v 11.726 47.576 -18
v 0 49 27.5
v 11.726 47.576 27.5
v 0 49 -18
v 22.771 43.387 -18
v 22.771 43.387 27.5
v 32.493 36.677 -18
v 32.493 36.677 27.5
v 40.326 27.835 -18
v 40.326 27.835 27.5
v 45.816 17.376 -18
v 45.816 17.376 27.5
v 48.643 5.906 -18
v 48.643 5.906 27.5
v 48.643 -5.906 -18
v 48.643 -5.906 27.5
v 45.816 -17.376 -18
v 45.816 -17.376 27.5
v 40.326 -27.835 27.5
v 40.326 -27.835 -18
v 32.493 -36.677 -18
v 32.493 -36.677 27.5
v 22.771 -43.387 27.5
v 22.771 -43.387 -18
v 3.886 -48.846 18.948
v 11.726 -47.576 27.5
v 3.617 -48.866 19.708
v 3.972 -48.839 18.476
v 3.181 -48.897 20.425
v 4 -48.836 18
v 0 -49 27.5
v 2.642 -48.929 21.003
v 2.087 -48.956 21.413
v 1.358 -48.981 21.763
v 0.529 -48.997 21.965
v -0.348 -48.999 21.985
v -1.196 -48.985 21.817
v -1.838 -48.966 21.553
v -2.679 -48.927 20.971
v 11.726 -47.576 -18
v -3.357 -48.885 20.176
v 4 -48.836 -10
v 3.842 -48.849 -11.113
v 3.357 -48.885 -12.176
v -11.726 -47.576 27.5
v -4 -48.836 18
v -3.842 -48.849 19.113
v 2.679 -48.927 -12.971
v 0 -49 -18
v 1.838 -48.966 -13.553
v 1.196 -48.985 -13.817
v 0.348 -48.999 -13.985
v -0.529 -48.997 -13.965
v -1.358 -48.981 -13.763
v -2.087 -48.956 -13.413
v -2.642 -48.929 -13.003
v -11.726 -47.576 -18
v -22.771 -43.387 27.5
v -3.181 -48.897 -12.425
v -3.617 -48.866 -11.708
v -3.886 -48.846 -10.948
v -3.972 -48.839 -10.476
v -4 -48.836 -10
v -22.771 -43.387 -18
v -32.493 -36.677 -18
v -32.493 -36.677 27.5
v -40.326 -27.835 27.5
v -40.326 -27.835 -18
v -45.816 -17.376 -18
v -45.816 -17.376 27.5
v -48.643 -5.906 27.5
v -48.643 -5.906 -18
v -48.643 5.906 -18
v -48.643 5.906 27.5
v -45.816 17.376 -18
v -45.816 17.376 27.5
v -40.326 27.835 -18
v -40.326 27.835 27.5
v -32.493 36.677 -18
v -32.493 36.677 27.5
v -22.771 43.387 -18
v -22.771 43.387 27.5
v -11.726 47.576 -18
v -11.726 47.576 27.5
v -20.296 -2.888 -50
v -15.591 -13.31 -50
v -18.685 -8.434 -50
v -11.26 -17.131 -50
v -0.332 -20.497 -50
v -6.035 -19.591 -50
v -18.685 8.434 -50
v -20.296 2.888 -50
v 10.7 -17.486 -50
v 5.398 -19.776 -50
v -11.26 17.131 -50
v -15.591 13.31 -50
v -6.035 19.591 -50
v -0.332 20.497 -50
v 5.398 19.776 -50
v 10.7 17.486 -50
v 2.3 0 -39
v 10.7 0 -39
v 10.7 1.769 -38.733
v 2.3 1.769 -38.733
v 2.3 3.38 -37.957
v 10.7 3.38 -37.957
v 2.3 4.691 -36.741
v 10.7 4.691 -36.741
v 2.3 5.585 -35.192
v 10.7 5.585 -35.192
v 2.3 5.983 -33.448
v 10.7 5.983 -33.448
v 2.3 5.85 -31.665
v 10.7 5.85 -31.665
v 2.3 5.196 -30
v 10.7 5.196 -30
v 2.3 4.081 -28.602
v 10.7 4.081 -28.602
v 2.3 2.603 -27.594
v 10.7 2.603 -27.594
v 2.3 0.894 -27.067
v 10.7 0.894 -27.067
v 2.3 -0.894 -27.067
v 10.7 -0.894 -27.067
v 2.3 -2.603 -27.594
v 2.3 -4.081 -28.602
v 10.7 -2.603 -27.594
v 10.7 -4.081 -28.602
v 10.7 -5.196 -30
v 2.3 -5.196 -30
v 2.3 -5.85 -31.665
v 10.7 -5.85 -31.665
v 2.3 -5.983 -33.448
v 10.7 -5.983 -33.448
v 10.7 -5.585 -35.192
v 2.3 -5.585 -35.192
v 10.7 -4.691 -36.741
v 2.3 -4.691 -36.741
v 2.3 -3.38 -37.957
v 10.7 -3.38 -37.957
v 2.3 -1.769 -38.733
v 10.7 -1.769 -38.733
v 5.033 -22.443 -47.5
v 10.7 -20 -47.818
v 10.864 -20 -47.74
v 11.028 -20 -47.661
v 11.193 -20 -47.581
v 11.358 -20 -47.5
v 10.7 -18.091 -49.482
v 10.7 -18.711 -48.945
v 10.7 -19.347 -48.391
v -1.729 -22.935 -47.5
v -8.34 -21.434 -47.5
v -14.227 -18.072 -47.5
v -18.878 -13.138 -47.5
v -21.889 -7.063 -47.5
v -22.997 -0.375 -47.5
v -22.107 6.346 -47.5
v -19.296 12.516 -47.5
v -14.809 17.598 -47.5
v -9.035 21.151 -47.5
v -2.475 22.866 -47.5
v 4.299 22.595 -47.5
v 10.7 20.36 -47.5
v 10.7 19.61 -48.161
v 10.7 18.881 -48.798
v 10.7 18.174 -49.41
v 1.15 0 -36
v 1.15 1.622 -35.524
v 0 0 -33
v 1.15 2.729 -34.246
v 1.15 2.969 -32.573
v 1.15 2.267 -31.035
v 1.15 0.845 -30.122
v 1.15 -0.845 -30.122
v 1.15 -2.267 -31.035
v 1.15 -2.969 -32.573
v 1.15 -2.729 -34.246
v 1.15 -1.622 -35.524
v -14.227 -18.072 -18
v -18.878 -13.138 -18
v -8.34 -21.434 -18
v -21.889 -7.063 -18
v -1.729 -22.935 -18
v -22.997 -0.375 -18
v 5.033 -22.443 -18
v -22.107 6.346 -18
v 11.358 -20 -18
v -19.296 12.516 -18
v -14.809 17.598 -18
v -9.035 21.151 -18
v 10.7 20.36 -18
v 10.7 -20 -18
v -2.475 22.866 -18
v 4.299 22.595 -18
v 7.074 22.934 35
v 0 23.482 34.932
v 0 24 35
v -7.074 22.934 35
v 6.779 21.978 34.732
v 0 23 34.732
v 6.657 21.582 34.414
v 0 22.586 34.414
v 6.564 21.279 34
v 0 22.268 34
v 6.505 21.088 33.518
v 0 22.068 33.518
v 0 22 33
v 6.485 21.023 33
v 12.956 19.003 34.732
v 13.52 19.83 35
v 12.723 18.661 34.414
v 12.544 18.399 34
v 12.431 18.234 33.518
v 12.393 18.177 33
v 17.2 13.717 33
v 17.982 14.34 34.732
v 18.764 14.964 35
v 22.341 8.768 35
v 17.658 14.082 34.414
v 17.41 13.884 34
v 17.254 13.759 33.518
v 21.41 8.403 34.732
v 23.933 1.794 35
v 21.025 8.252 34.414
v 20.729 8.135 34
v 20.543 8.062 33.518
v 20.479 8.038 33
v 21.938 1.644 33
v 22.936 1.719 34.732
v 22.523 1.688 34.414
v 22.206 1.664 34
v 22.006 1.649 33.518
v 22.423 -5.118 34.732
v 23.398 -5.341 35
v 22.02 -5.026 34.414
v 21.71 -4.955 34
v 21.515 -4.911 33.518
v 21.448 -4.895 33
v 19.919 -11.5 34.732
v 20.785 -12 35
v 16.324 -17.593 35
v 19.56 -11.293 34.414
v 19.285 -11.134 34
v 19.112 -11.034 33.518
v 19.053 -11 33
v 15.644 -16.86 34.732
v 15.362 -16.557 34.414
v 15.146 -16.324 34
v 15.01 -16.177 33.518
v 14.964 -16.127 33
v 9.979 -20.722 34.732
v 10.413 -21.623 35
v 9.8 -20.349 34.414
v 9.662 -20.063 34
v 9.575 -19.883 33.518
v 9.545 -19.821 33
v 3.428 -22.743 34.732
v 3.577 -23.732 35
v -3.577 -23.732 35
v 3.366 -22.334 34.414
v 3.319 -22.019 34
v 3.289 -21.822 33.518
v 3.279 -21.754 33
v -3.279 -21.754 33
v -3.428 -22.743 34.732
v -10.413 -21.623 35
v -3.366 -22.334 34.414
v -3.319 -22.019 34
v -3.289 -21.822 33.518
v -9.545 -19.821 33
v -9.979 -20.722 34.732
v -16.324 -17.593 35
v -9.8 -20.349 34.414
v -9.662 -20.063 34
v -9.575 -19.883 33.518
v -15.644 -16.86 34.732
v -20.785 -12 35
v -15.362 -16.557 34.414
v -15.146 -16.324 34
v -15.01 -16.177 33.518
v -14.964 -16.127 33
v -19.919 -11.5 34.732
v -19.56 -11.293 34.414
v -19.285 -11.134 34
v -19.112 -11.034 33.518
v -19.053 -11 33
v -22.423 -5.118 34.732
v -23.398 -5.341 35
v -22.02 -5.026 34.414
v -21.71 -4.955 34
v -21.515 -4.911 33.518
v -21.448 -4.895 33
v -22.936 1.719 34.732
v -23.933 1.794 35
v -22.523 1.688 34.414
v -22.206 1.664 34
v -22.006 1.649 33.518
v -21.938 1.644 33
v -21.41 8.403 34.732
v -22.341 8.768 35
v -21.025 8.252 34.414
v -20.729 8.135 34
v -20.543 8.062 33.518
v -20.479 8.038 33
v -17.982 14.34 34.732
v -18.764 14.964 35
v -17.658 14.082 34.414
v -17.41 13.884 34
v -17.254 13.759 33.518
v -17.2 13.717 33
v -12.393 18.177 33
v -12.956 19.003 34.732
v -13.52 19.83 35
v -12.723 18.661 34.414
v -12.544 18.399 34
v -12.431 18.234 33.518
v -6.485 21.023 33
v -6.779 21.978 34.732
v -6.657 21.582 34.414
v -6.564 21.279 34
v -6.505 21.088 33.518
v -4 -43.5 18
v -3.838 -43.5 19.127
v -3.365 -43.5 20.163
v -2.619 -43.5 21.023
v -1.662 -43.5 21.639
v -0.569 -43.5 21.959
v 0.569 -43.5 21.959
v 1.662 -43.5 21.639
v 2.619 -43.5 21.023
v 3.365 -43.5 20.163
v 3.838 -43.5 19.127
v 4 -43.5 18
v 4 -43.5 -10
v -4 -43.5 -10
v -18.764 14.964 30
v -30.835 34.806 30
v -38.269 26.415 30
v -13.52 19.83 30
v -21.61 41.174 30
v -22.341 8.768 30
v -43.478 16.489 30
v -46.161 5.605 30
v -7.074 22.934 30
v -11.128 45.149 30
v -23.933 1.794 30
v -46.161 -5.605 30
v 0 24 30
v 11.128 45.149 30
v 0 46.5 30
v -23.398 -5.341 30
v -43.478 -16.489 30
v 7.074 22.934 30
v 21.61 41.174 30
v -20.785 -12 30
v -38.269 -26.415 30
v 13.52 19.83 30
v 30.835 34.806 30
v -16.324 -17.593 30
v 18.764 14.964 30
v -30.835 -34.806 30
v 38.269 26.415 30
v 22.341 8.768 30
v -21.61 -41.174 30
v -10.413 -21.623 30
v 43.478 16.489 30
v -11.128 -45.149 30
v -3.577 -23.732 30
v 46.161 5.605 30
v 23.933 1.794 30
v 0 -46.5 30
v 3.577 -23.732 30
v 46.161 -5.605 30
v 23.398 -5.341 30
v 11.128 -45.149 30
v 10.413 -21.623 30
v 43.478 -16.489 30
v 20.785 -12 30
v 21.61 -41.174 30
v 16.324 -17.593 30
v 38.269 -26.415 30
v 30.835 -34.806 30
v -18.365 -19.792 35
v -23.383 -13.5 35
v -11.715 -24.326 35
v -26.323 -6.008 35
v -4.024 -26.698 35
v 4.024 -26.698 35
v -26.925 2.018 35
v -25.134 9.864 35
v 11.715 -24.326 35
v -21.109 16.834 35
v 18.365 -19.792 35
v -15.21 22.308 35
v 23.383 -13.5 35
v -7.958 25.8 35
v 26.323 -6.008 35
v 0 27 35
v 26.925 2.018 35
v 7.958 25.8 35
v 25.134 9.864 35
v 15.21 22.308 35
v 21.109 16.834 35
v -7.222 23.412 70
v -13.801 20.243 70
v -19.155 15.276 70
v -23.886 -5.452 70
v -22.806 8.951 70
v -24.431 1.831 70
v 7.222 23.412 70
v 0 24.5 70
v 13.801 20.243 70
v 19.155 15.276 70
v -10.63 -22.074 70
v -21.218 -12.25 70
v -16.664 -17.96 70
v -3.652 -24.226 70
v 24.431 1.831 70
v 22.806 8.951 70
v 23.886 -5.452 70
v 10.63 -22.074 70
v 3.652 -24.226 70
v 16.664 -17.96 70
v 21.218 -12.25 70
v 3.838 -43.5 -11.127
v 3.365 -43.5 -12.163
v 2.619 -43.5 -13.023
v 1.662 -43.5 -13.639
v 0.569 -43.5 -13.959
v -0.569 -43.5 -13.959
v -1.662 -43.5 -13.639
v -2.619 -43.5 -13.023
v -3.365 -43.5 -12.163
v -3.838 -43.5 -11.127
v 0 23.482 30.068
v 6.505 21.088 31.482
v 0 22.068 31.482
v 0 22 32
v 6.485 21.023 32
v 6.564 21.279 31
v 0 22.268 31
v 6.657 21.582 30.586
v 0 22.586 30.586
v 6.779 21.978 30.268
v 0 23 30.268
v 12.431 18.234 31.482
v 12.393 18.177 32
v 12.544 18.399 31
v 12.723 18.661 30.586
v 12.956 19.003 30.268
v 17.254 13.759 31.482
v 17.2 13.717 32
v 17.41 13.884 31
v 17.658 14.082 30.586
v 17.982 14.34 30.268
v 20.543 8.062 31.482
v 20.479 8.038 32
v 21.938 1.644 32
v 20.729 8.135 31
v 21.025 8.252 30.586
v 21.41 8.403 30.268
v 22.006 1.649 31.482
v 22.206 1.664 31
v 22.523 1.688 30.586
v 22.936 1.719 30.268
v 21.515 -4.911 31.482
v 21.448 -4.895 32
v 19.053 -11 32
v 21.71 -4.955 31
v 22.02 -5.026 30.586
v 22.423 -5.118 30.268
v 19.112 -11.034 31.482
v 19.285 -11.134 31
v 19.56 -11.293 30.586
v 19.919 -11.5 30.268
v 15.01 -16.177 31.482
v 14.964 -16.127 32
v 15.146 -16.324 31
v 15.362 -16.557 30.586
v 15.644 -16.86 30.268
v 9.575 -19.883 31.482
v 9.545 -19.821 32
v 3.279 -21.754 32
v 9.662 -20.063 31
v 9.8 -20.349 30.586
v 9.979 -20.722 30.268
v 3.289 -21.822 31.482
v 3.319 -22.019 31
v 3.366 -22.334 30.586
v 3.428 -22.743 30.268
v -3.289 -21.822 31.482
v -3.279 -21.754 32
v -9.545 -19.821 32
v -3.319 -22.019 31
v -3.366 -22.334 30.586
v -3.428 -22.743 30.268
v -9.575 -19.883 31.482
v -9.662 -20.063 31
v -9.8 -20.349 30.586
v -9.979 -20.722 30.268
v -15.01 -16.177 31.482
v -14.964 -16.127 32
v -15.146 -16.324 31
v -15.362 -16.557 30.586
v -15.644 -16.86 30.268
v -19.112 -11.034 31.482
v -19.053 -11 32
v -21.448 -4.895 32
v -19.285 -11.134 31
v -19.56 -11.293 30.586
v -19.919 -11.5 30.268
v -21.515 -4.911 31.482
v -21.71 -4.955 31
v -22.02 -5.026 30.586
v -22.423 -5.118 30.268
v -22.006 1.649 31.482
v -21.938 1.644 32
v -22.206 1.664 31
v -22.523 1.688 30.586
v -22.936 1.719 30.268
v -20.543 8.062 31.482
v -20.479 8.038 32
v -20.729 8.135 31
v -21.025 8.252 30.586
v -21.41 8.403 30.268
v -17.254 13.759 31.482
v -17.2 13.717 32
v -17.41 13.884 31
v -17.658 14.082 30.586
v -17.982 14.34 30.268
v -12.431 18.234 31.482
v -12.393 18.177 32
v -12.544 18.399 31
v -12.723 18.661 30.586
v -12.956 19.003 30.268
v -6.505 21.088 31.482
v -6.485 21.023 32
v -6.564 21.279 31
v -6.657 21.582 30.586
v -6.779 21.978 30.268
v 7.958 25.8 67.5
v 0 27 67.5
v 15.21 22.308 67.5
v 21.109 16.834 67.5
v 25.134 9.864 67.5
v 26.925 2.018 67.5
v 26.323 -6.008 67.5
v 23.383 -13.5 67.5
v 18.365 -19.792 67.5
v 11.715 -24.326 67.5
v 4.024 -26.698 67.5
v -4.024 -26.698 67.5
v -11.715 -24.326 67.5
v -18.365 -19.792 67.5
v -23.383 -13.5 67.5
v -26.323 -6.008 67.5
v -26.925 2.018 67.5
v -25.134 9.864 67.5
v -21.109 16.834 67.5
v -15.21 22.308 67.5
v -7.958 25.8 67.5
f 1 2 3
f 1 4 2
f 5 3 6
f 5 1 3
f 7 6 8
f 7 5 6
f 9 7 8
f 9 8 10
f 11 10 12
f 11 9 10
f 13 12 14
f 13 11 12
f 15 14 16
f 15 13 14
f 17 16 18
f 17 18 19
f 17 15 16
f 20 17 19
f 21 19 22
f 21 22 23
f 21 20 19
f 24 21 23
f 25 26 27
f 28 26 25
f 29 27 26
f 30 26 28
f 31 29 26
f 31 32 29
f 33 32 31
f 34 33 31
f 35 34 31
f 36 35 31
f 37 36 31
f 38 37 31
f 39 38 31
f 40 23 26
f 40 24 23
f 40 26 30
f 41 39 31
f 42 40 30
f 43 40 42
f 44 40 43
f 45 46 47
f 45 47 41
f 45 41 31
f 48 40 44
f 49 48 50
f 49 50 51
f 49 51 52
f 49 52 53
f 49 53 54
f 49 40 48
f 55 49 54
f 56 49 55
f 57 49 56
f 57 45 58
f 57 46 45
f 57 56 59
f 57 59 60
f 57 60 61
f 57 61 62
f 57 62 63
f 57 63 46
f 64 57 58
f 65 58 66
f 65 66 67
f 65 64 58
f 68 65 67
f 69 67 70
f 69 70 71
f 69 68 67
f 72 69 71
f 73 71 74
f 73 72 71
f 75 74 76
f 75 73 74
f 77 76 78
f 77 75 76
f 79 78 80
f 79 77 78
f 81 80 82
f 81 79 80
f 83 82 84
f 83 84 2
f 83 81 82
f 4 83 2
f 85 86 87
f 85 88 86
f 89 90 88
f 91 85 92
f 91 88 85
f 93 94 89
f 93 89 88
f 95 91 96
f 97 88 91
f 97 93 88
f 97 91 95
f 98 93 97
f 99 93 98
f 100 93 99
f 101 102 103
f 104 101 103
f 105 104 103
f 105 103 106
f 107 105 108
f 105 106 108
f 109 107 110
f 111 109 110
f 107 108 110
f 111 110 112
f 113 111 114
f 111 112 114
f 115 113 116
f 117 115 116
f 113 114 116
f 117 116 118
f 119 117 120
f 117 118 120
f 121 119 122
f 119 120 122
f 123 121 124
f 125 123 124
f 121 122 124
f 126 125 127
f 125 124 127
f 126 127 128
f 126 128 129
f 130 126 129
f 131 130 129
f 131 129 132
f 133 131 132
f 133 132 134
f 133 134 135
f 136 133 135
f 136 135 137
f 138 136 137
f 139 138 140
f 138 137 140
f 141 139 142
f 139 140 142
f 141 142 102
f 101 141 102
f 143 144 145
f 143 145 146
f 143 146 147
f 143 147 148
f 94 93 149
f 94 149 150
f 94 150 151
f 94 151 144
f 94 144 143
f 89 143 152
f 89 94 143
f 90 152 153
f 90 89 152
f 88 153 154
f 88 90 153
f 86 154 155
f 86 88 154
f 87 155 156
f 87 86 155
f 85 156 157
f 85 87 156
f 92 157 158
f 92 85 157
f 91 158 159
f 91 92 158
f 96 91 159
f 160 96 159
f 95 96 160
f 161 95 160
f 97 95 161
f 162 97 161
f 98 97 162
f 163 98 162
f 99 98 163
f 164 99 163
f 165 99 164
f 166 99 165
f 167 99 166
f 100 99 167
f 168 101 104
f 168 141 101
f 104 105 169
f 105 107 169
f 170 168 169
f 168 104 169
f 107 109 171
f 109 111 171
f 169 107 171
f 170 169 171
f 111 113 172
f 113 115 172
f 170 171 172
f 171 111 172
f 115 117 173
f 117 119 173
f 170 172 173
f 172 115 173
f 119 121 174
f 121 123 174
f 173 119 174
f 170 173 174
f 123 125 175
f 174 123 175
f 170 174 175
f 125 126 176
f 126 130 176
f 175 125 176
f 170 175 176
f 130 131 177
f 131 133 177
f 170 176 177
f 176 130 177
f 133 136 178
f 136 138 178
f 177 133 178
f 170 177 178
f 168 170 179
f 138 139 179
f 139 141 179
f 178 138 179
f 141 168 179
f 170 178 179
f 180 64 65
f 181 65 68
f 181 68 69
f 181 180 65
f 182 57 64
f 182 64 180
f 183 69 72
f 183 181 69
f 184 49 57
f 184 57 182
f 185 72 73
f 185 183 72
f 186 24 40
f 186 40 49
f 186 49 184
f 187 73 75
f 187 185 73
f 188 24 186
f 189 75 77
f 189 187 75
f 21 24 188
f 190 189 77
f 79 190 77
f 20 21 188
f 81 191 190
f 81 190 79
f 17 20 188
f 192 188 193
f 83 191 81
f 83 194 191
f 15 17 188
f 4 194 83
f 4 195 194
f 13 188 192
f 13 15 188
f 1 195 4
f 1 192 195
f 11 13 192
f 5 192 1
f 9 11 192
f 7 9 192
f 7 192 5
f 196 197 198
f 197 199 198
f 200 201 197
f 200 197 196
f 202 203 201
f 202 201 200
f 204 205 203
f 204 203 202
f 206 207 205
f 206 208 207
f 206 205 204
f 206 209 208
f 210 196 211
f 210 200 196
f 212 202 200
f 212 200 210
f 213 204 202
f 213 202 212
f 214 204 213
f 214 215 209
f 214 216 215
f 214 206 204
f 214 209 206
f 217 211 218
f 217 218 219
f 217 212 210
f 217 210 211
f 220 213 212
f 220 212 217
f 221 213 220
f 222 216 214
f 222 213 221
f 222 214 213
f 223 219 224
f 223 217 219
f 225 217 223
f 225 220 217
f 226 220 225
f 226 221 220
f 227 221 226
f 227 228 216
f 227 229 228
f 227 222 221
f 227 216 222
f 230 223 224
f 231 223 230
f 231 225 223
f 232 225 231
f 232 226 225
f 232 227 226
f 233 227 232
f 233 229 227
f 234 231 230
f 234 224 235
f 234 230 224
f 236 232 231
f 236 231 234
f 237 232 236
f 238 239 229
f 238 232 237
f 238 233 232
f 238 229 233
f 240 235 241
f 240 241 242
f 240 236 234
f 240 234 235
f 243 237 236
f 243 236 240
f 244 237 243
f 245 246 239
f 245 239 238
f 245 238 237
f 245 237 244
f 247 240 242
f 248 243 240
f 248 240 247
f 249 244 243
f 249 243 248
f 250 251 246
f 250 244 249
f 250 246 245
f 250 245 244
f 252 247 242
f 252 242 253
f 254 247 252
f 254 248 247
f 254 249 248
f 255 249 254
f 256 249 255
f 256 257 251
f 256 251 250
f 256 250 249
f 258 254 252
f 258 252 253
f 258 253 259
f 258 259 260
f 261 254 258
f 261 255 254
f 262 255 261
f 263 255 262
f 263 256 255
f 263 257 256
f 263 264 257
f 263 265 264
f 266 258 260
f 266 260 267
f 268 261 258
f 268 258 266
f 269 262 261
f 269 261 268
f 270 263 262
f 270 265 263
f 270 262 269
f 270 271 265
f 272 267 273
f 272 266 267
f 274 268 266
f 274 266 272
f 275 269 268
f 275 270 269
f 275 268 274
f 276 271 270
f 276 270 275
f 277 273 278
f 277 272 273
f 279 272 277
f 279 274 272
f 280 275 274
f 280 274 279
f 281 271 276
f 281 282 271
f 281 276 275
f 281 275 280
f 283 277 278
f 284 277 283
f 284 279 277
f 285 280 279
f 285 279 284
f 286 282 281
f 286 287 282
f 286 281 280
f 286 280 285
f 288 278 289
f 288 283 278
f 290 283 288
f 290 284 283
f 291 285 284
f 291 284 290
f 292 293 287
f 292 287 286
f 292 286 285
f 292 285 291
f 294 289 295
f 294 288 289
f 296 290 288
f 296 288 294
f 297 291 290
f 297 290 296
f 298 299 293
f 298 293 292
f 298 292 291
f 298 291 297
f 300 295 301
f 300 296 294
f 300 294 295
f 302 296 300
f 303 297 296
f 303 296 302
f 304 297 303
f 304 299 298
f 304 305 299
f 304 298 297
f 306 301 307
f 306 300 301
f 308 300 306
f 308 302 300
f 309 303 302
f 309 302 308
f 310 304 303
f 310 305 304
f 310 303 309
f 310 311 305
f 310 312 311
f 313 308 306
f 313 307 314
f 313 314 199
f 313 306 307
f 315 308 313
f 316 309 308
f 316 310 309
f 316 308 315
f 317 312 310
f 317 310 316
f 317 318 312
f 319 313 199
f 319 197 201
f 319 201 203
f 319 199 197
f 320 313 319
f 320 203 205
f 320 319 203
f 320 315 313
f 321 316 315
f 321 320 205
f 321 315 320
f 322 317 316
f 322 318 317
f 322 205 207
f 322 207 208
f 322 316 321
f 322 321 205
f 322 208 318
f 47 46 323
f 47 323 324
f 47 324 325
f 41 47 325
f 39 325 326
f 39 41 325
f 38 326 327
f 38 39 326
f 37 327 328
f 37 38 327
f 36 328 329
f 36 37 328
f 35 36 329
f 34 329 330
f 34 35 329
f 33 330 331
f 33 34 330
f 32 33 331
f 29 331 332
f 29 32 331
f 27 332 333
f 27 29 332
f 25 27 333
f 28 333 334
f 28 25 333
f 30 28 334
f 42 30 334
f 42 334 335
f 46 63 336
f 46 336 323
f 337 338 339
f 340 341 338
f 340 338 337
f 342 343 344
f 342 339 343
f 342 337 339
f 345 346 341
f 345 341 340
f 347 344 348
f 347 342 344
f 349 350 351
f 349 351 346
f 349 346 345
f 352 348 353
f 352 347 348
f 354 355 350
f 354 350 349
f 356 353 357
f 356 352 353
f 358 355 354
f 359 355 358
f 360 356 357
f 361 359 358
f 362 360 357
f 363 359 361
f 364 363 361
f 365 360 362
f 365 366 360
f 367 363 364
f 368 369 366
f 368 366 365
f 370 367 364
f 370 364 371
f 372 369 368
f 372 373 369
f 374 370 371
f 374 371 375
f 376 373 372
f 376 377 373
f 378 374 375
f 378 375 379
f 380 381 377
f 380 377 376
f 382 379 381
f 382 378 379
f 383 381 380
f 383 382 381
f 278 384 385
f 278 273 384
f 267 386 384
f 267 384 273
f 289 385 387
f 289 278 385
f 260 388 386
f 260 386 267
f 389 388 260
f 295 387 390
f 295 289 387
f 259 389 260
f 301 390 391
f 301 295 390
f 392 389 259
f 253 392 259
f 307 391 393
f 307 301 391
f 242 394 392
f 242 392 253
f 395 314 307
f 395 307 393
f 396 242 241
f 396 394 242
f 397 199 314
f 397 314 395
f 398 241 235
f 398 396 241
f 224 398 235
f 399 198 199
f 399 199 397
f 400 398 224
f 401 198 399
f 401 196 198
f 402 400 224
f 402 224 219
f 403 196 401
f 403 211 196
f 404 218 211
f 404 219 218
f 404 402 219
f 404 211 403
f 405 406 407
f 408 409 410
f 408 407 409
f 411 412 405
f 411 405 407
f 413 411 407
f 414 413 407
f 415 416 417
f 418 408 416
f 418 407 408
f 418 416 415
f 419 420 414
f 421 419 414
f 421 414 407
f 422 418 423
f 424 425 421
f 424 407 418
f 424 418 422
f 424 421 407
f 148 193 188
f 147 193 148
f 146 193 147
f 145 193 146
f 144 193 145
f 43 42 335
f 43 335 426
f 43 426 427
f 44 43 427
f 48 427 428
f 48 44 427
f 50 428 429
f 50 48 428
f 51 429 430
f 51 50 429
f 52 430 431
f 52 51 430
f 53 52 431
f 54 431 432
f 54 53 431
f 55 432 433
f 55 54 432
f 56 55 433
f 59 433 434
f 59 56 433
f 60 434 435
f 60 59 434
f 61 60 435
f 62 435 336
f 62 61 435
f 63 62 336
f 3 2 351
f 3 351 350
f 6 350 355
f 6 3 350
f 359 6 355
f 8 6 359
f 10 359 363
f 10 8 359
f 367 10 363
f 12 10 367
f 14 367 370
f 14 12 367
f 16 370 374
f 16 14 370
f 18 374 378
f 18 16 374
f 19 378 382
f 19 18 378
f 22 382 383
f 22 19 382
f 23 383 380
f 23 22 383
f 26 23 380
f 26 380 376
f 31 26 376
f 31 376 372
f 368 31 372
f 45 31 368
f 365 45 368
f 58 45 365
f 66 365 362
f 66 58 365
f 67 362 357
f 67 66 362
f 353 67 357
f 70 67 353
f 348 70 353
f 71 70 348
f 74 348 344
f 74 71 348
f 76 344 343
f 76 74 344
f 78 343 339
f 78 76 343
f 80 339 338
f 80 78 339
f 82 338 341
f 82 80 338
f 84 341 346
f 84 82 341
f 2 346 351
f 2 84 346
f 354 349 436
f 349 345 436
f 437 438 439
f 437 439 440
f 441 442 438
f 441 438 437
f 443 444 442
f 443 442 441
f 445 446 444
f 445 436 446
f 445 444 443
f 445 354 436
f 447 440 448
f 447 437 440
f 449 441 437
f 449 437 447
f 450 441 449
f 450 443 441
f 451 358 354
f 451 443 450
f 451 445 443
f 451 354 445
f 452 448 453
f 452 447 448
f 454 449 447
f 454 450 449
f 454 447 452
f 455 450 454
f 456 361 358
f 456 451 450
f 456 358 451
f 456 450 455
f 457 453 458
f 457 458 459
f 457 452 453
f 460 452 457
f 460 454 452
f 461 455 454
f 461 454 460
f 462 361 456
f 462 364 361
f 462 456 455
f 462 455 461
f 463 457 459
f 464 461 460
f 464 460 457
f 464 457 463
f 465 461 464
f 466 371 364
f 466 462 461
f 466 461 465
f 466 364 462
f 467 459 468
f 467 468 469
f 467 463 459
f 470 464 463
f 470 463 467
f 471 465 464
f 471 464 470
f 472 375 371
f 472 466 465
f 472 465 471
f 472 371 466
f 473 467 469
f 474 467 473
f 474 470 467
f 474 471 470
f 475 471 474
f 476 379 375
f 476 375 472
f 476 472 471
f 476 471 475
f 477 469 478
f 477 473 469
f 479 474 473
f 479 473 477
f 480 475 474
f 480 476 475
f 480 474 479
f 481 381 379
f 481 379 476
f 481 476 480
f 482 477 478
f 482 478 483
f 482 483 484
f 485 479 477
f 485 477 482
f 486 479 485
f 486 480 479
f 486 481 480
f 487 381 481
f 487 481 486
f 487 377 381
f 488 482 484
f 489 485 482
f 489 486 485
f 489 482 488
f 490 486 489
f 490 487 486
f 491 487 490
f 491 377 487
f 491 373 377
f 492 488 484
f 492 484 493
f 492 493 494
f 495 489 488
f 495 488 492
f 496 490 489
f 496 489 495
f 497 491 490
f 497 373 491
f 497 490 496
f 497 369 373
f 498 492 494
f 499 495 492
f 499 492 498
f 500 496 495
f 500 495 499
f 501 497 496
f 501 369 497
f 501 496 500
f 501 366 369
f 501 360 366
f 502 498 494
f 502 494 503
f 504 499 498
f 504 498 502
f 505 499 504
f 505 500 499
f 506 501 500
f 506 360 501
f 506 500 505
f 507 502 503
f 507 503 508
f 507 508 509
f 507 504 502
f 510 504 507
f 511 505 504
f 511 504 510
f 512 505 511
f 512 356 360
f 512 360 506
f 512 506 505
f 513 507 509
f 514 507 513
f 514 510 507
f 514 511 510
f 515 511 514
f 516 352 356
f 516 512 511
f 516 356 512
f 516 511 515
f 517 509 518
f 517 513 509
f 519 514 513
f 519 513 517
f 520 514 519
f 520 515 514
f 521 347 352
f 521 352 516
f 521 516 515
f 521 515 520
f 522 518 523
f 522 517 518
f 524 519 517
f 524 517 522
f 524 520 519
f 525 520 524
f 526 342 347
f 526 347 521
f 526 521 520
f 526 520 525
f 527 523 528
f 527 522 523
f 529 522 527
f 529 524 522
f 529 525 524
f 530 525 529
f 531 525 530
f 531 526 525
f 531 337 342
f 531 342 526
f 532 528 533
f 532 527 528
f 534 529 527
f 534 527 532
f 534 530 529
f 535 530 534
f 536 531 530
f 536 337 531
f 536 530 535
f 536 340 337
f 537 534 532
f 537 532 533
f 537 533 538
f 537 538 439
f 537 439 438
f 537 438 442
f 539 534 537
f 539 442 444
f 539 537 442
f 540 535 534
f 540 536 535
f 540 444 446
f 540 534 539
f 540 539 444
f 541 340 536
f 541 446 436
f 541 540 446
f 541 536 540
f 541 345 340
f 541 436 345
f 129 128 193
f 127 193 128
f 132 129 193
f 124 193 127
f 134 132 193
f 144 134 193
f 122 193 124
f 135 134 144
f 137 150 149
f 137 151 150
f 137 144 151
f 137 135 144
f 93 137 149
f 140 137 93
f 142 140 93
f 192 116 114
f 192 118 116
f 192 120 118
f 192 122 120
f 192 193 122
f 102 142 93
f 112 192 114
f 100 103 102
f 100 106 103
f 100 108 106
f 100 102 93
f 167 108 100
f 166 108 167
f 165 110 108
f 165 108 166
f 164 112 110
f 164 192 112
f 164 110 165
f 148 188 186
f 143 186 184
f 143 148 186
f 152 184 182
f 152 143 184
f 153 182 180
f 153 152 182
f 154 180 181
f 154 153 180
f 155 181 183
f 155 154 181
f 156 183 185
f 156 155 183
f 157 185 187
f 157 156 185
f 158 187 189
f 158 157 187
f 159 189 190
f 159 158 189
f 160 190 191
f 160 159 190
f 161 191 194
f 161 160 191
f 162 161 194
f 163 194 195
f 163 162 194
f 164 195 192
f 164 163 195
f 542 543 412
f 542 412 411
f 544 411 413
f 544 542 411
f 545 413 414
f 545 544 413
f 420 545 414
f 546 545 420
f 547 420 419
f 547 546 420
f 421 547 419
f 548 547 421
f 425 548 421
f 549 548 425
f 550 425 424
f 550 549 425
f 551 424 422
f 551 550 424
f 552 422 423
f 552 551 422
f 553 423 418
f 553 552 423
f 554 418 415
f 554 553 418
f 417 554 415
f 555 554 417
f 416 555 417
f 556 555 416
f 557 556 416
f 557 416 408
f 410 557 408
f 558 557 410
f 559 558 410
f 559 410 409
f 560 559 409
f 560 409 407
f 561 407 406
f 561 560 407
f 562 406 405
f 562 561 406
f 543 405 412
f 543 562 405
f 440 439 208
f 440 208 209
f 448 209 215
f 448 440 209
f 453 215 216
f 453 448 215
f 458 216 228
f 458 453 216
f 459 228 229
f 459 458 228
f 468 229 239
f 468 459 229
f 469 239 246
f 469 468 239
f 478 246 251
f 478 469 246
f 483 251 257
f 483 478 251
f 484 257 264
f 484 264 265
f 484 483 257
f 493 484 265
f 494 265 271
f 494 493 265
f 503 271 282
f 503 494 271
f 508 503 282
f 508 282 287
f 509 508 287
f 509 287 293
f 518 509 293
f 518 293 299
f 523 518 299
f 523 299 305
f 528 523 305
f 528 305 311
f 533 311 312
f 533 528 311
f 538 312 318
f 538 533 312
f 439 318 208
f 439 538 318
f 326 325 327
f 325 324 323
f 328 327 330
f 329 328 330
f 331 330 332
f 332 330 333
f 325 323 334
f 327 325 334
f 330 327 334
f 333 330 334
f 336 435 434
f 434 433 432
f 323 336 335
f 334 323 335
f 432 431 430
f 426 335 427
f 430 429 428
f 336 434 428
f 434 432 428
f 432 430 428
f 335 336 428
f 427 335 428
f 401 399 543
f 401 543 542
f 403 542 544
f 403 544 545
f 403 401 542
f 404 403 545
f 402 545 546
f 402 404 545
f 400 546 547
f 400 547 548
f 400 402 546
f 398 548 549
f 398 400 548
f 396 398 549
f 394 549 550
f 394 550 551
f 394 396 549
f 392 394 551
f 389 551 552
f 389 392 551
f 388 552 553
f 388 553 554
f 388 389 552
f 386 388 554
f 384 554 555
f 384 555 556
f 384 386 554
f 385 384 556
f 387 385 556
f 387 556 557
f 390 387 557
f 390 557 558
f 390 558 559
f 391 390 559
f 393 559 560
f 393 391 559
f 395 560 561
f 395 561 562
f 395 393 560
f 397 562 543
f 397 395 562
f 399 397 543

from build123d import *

# Parameters (mm, degrees)
CHAMFER1_SIZE      = 2.5
CUT_EXTRUDE1_DEPTH = 5.5
SKETCH5_W          = 36
SKETCH5_H          = 43
CUT_EXTRUDE2_DEPTH = 12.3
SKETCH6_R          = 6
CUT_EXTRUDE3_DEPTH = 8.4
SKETCH7_R          = 6
FILLET2_R          = 2


with BuildPart() as part:
    # Sketch1 → Revolve1 (revolve)
    with BuildSketch(Plane(origin=(0, 0, 0), x_dir=(0, 0, -1), z_dir=(1, 0, 0))):
        Polygon((-70, 0), (-70, 27), (-35, 27), (-35, 22), (-30, 22), (-30, 49), (18, 49), (18, 23), (50, 23), (50, 0), align=None)
    revolve(axis=Axis((0, 0, 127.018539307), (0, 0, -1)))

    # Chamfer1
    chamfer1_edges = [part.edges().sort_by_distance(p)[0] for p in [
        (0, -27, 70),
        (0, -23, -50),
        (0, -49, 30),
    ]]
    chamfer(chamfer1_edges, length=CHAMFER1_SIZE)

    # Sketch3 → Cut-Extrude1 (cut)
    with BuildSketch(Plane(origin=(0, -49, 0), x_dir=(-1, 0, 0), z_dir=(0, -1, 0))):
        with BuildLine():
            Line((-4, -18), (-4, 10))
            ThreePointArc((-4, 10), (0, 14), (4, 10))
            Line((4, 10), (4, -18))
            ThreePointArc((4, -18), (0, -22), (-4, -18))
        make_face()
    extrude(amount=-CUT_EXTRUDE1_DEPTH, mode=Mode.SUBTRACT)

    # Sketch5 → Cut-Extrude2 (cut)
    with BuildSketch(Plane(origin=(10.7, 0, 0), x_dir=(0, 0, -1), z_dir=(1, 0, 0))):
        with Locations((36, 1.5)):
            Rectangle(SKETCH5_W, SKETCH5_H)
    extrude(amount=CUT_EXTRUDE2_DEPTH, mode=Mode.SUBTRACT)

    # Sketch6 → Cut-Extrude3 (cut)
    with BuildSketch(Plane(origin=(10.7, 0, 0), x_dir=(0, 0, -1), z_dir=(1, 0, 0))):
        with Locations((33, 0)):
            Circle(SKETCH6_R)
    extrude(amount=-CUT_EXTRUDE3_DEPTH, mode=Mode.SUBTRACT)

    # Sketch7 → Cut-Loft1 section 0
    with BuildSketch(Plane(origin=(2.3, 0, 0), x_dir=(0, 0, -1), z_dir=(1, 0, 0)), mode=Mode.PRIVATE) as cut_loft1_s0:
        with Locations((33, 0)):
            Circle(SKETCH7_R)
    loft([Vertex(0, 0, -33), cut_loft1_s0.sketch], mode=Mode.SUBTRACT)

    # Fillet2
    fillet2_edges = [part.edges().sort_by_distance(p)[0] for p in [
        (0, -22, 30),
        (0, -22, 35),
    ]]
    fillet(fillet2_edges, radius=FILLET2_R)


solid = part.part
